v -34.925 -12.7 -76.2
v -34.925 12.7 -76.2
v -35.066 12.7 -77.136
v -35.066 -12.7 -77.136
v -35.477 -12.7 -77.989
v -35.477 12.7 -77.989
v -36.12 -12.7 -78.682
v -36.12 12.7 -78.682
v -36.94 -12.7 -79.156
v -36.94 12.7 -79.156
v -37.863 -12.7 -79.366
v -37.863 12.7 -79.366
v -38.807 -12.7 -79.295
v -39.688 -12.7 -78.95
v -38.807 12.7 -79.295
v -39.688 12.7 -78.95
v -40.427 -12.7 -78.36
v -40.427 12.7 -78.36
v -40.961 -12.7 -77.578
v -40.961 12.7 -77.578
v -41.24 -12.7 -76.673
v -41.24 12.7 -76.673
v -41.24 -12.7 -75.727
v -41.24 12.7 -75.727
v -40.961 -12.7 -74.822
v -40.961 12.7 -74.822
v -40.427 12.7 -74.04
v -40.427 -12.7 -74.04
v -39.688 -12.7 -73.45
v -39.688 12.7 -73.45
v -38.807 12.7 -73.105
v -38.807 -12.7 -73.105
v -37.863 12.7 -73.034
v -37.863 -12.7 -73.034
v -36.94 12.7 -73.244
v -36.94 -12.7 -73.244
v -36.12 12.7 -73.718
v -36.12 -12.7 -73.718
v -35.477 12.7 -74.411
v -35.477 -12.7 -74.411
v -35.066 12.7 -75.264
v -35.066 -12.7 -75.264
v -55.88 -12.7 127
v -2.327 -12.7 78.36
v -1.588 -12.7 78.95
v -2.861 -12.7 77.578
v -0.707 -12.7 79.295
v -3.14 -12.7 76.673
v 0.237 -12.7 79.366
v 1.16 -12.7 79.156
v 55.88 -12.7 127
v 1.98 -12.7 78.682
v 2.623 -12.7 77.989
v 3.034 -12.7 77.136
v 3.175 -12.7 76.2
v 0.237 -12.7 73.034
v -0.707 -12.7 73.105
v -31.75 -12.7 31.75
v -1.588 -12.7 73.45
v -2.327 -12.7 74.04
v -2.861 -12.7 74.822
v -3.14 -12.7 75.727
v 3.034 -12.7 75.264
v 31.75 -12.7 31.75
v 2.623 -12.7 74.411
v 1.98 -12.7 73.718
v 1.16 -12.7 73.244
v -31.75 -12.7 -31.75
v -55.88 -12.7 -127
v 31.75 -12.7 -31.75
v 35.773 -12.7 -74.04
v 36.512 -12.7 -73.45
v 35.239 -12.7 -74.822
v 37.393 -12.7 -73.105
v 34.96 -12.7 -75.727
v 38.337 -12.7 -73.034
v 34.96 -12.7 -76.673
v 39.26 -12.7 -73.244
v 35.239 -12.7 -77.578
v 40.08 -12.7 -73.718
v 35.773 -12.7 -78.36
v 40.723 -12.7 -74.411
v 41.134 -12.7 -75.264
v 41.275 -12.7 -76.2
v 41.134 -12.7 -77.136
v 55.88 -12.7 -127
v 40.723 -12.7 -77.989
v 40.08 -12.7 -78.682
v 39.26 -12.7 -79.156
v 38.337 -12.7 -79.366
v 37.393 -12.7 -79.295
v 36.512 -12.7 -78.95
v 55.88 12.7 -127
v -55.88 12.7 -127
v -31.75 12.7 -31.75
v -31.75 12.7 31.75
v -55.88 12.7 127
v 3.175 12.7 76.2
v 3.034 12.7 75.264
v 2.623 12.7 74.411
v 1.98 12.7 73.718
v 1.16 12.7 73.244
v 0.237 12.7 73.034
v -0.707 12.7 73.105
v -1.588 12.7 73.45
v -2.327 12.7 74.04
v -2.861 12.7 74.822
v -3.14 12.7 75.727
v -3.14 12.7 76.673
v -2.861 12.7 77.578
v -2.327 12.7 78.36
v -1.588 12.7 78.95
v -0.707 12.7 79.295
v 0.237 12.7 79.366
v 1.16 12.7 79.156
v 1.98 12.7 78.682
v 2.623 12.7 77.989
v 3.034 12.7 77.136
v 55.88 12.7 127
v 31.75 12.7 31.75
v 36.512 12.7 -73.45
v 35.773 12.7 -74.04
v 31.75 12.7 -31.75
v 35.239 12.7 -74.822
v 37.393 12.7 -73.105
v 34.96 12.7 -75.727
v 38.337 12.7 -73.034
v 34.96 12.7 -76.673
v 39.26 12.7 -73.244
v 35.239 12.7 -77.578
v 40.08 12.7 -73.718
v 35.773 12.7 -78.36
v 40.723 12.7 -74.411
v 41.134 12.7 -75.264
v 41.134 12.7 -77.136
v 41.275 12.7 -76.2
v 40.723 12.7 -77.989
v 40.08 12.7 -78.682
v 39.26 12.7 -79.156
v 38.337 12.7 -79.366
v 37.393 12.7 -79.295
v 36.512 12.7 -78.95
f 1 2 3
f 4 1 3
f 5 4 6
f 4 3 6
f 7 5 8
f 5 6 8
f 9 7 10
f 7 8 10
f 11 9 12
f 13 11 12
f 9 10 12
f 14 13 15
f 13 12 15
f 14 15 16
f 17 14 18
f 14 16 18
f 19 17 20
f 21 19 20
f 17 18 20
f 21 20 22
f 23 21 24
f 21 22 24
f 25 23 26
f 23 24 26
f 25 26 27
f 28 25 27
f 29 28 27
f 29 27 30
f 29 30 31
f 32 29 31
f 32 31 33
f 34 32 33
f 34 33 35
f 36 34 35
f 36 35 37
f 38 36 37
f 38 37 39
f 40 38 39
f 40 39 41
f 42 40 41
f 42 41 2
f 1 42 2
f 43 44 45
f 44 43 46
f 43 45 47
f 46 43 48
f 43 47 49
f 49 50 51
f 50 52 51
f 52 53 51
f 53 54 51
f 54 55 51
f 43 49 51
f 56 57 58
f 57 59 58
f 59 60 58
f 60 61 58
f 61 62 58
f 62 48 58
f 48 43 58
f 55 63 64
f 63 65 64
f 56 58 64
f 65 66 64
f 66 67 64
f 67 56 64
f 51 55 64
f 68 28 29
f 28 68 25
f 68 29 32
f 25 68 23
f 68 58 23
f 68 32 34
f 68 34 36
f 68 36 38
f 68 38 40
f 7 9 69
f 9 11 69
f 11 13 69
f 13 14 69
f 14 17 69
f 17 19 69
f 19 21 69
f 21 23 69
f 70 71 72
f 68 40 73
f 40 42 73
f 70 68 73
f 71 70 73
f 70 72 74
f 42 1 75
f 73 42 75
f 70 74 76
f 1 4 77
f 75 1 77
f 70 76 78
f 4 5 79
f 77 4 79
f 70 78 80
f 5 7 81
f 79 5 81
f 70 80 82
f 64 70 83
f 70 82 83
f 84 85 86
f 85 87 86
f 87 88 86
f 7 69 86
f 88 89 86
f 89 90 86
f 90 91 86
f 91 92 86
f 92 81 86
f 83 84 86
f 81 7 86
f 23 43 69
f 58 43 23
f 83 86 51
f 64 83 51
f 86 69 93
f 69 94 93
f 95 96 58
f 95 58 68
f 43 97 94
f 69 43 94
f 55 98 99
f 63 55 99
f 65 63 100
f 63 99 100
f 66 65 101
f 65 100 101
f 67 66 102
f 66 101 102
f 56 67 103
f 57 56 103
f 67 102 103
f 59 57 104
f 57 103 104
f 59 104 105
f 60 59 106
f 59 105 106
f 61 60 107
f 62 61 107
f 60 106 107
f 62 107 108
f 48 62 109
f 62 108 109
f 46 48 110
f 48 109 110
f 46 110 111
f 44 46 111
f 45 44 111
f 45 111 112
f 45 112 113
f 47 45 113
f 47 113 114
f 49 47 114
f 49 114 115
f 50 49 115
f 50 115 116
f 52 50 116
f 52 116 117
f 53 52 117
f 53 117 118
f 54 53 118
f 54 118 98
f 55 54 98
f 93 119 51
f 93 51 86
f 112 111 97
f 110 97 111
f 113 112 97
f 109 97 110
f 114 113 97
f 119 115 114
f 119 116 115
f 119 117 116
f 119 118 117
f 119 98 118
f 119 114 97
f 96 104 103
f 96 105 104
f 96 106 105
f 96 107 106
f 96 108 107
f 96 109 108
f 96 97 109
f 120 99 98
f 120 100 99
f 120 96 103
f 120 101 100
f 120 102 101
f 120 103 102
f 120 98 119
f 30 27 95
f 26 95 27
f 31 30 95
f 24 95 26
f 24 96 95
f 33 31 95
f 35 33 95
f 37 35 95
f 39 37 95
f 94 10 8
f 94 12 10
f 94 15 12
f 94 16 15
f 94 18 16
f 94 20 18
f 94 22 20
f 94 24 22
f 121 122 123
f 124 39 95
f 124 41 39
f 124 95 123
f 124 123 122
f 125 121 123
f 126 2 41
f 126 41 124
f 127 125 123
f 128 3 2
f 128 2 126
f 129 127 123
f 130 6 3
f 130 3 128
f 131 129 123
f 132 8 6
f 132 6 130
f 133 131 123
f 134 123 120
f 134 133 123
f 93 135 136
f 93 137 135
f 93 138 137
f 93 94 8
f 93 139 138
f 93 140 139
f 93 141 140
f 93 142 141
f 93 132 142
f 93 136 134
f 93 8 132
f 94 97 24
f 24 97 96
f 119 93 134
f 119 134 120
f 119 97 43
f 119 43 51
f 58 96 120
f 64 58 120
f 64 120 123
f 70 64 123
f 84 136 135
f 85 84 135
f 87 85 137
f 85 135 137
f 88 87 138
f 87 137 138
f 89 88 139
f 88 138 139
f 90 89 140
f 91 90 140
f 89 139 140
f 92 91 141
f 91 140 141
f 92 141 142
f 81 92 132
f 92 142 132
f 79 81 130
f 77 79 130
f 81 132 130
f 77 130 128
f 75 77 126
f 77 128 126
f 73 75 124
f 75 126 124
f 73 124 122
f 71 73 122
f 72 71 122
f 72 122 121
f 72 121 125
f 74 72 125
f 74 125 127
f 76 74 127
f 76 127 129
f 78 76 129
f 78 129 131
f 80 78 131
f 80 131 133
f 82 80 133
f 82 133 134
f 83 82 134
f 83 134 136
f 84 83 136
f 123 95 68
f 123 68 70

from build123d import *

# Parameters (mm, degrees)
SKETCH1_W           = 111.76
SKETCH1_H           = 254
BOSS_EXTRUDE1_DEPTH = 12.7
SKETCH2_W           = 63.5
SKETCH2_H           = 63.5
CUT_EXTRUDE1_DEPTH  = 25.4
CUT_EXTRUDE2_REACH  = 27.4
SKETCH3_R           = 3.175


with BuildPart() as part:
    # Sketch1 → Boss-Extrude1 (new body, symmetric)
    with BuildSketch(Plane(origin=(0, 0, 0), x_dir=(1, 0, 0), z_dir=(0, 1, 0))):
        Rectangle(SKETCH1_W, SKETCH1_H)
    extrude(amount=BOSS_EXTRUDE1_DEPTH, both=True)

    # Sketch2 → Cut-Extrude1 (cut)
    with BuildSketch(Plane(origin=(0, 12.7, 0), x_dir=(1, 0, 0), z_dir=(0, 1, 0))):
        Rectangle(SKETCH2_W, SKETCH2_H)
    extrude(amount=-CUT_EXTRUDE1_DEPTH, mode=Mode.SUBTRACT)

    # Sketch3 → Cut-Extrude2 (cut, up to next)
    with BuildSketch(Plane(origin=(0, 12.7, 0), x_dir=(1, 0, 0), z_dir=(0, 1, 0)), mode=Mode.PRIVATE) as cut_extrude2_sk1:
        with Locations((0, -76.2)):
            Circle(SKETCH3_R)
    cut_extrude2_tool1 = extrude(cut_extrude2_sk1.sketch, amount=-CUT_EXTRUDE2_REACH, mode=Mode.PRIVATE) & part.part
    add(cut_extrude2_tool1.solids().sort_by_distance((0, 12.7, 76.2))[0], mode=Mode.SUBTRACT)
    # Sketch3 → Cut-Extrude2 (cut, up to next)
    with BuildSketch(Plane(origin=(0, 12.7, 0), x_dir=(1, 0, 0), z_dir=(0, 1, 0)), mode=Mode.PRIVATE) as cut_extrude2_sk2:
        with Locations((38.1, 76.2)):
            Circle(SKETCH3_R)
    cut_extrude2_tool2 = extrude(cut_extrude2_sk2.sketch, amount=-CUT_EXTRUDE2_REACH, mode=Mode.PRIVATE) & part.part
    add(cut_extrude2_tool2.solids().sort_by_distance((38.1, 12.7, -76.2))[0], mode=Mode.SUBTRACT)
    # Sketch3 → Cut-Extrude2 (cut, up to next)
    with BuildSketch(Plane(origin=(0, 12.7, 0), x_dir=(1, 0, 0), z_dir=(0, 1, 0)), mode=Mode.PRIVATE) as cut_extrude2_sk3:
        with Locations((-38.1, 76.2)):
            Circle(SKETCH3_R)
    cut_extrude2_tool3 = extrude(cut_extrude2_sk3.sketch, amount=-CUT_EXTRUDE2_REACH, mode=Mode.PRIVATE) & part.part
    add(cut_extrude2_tool3.solids().sort_by_distance((-38.1, 12.7, -76.2))[0], mode=Mode.SUBTRACT)


solid = part.part
